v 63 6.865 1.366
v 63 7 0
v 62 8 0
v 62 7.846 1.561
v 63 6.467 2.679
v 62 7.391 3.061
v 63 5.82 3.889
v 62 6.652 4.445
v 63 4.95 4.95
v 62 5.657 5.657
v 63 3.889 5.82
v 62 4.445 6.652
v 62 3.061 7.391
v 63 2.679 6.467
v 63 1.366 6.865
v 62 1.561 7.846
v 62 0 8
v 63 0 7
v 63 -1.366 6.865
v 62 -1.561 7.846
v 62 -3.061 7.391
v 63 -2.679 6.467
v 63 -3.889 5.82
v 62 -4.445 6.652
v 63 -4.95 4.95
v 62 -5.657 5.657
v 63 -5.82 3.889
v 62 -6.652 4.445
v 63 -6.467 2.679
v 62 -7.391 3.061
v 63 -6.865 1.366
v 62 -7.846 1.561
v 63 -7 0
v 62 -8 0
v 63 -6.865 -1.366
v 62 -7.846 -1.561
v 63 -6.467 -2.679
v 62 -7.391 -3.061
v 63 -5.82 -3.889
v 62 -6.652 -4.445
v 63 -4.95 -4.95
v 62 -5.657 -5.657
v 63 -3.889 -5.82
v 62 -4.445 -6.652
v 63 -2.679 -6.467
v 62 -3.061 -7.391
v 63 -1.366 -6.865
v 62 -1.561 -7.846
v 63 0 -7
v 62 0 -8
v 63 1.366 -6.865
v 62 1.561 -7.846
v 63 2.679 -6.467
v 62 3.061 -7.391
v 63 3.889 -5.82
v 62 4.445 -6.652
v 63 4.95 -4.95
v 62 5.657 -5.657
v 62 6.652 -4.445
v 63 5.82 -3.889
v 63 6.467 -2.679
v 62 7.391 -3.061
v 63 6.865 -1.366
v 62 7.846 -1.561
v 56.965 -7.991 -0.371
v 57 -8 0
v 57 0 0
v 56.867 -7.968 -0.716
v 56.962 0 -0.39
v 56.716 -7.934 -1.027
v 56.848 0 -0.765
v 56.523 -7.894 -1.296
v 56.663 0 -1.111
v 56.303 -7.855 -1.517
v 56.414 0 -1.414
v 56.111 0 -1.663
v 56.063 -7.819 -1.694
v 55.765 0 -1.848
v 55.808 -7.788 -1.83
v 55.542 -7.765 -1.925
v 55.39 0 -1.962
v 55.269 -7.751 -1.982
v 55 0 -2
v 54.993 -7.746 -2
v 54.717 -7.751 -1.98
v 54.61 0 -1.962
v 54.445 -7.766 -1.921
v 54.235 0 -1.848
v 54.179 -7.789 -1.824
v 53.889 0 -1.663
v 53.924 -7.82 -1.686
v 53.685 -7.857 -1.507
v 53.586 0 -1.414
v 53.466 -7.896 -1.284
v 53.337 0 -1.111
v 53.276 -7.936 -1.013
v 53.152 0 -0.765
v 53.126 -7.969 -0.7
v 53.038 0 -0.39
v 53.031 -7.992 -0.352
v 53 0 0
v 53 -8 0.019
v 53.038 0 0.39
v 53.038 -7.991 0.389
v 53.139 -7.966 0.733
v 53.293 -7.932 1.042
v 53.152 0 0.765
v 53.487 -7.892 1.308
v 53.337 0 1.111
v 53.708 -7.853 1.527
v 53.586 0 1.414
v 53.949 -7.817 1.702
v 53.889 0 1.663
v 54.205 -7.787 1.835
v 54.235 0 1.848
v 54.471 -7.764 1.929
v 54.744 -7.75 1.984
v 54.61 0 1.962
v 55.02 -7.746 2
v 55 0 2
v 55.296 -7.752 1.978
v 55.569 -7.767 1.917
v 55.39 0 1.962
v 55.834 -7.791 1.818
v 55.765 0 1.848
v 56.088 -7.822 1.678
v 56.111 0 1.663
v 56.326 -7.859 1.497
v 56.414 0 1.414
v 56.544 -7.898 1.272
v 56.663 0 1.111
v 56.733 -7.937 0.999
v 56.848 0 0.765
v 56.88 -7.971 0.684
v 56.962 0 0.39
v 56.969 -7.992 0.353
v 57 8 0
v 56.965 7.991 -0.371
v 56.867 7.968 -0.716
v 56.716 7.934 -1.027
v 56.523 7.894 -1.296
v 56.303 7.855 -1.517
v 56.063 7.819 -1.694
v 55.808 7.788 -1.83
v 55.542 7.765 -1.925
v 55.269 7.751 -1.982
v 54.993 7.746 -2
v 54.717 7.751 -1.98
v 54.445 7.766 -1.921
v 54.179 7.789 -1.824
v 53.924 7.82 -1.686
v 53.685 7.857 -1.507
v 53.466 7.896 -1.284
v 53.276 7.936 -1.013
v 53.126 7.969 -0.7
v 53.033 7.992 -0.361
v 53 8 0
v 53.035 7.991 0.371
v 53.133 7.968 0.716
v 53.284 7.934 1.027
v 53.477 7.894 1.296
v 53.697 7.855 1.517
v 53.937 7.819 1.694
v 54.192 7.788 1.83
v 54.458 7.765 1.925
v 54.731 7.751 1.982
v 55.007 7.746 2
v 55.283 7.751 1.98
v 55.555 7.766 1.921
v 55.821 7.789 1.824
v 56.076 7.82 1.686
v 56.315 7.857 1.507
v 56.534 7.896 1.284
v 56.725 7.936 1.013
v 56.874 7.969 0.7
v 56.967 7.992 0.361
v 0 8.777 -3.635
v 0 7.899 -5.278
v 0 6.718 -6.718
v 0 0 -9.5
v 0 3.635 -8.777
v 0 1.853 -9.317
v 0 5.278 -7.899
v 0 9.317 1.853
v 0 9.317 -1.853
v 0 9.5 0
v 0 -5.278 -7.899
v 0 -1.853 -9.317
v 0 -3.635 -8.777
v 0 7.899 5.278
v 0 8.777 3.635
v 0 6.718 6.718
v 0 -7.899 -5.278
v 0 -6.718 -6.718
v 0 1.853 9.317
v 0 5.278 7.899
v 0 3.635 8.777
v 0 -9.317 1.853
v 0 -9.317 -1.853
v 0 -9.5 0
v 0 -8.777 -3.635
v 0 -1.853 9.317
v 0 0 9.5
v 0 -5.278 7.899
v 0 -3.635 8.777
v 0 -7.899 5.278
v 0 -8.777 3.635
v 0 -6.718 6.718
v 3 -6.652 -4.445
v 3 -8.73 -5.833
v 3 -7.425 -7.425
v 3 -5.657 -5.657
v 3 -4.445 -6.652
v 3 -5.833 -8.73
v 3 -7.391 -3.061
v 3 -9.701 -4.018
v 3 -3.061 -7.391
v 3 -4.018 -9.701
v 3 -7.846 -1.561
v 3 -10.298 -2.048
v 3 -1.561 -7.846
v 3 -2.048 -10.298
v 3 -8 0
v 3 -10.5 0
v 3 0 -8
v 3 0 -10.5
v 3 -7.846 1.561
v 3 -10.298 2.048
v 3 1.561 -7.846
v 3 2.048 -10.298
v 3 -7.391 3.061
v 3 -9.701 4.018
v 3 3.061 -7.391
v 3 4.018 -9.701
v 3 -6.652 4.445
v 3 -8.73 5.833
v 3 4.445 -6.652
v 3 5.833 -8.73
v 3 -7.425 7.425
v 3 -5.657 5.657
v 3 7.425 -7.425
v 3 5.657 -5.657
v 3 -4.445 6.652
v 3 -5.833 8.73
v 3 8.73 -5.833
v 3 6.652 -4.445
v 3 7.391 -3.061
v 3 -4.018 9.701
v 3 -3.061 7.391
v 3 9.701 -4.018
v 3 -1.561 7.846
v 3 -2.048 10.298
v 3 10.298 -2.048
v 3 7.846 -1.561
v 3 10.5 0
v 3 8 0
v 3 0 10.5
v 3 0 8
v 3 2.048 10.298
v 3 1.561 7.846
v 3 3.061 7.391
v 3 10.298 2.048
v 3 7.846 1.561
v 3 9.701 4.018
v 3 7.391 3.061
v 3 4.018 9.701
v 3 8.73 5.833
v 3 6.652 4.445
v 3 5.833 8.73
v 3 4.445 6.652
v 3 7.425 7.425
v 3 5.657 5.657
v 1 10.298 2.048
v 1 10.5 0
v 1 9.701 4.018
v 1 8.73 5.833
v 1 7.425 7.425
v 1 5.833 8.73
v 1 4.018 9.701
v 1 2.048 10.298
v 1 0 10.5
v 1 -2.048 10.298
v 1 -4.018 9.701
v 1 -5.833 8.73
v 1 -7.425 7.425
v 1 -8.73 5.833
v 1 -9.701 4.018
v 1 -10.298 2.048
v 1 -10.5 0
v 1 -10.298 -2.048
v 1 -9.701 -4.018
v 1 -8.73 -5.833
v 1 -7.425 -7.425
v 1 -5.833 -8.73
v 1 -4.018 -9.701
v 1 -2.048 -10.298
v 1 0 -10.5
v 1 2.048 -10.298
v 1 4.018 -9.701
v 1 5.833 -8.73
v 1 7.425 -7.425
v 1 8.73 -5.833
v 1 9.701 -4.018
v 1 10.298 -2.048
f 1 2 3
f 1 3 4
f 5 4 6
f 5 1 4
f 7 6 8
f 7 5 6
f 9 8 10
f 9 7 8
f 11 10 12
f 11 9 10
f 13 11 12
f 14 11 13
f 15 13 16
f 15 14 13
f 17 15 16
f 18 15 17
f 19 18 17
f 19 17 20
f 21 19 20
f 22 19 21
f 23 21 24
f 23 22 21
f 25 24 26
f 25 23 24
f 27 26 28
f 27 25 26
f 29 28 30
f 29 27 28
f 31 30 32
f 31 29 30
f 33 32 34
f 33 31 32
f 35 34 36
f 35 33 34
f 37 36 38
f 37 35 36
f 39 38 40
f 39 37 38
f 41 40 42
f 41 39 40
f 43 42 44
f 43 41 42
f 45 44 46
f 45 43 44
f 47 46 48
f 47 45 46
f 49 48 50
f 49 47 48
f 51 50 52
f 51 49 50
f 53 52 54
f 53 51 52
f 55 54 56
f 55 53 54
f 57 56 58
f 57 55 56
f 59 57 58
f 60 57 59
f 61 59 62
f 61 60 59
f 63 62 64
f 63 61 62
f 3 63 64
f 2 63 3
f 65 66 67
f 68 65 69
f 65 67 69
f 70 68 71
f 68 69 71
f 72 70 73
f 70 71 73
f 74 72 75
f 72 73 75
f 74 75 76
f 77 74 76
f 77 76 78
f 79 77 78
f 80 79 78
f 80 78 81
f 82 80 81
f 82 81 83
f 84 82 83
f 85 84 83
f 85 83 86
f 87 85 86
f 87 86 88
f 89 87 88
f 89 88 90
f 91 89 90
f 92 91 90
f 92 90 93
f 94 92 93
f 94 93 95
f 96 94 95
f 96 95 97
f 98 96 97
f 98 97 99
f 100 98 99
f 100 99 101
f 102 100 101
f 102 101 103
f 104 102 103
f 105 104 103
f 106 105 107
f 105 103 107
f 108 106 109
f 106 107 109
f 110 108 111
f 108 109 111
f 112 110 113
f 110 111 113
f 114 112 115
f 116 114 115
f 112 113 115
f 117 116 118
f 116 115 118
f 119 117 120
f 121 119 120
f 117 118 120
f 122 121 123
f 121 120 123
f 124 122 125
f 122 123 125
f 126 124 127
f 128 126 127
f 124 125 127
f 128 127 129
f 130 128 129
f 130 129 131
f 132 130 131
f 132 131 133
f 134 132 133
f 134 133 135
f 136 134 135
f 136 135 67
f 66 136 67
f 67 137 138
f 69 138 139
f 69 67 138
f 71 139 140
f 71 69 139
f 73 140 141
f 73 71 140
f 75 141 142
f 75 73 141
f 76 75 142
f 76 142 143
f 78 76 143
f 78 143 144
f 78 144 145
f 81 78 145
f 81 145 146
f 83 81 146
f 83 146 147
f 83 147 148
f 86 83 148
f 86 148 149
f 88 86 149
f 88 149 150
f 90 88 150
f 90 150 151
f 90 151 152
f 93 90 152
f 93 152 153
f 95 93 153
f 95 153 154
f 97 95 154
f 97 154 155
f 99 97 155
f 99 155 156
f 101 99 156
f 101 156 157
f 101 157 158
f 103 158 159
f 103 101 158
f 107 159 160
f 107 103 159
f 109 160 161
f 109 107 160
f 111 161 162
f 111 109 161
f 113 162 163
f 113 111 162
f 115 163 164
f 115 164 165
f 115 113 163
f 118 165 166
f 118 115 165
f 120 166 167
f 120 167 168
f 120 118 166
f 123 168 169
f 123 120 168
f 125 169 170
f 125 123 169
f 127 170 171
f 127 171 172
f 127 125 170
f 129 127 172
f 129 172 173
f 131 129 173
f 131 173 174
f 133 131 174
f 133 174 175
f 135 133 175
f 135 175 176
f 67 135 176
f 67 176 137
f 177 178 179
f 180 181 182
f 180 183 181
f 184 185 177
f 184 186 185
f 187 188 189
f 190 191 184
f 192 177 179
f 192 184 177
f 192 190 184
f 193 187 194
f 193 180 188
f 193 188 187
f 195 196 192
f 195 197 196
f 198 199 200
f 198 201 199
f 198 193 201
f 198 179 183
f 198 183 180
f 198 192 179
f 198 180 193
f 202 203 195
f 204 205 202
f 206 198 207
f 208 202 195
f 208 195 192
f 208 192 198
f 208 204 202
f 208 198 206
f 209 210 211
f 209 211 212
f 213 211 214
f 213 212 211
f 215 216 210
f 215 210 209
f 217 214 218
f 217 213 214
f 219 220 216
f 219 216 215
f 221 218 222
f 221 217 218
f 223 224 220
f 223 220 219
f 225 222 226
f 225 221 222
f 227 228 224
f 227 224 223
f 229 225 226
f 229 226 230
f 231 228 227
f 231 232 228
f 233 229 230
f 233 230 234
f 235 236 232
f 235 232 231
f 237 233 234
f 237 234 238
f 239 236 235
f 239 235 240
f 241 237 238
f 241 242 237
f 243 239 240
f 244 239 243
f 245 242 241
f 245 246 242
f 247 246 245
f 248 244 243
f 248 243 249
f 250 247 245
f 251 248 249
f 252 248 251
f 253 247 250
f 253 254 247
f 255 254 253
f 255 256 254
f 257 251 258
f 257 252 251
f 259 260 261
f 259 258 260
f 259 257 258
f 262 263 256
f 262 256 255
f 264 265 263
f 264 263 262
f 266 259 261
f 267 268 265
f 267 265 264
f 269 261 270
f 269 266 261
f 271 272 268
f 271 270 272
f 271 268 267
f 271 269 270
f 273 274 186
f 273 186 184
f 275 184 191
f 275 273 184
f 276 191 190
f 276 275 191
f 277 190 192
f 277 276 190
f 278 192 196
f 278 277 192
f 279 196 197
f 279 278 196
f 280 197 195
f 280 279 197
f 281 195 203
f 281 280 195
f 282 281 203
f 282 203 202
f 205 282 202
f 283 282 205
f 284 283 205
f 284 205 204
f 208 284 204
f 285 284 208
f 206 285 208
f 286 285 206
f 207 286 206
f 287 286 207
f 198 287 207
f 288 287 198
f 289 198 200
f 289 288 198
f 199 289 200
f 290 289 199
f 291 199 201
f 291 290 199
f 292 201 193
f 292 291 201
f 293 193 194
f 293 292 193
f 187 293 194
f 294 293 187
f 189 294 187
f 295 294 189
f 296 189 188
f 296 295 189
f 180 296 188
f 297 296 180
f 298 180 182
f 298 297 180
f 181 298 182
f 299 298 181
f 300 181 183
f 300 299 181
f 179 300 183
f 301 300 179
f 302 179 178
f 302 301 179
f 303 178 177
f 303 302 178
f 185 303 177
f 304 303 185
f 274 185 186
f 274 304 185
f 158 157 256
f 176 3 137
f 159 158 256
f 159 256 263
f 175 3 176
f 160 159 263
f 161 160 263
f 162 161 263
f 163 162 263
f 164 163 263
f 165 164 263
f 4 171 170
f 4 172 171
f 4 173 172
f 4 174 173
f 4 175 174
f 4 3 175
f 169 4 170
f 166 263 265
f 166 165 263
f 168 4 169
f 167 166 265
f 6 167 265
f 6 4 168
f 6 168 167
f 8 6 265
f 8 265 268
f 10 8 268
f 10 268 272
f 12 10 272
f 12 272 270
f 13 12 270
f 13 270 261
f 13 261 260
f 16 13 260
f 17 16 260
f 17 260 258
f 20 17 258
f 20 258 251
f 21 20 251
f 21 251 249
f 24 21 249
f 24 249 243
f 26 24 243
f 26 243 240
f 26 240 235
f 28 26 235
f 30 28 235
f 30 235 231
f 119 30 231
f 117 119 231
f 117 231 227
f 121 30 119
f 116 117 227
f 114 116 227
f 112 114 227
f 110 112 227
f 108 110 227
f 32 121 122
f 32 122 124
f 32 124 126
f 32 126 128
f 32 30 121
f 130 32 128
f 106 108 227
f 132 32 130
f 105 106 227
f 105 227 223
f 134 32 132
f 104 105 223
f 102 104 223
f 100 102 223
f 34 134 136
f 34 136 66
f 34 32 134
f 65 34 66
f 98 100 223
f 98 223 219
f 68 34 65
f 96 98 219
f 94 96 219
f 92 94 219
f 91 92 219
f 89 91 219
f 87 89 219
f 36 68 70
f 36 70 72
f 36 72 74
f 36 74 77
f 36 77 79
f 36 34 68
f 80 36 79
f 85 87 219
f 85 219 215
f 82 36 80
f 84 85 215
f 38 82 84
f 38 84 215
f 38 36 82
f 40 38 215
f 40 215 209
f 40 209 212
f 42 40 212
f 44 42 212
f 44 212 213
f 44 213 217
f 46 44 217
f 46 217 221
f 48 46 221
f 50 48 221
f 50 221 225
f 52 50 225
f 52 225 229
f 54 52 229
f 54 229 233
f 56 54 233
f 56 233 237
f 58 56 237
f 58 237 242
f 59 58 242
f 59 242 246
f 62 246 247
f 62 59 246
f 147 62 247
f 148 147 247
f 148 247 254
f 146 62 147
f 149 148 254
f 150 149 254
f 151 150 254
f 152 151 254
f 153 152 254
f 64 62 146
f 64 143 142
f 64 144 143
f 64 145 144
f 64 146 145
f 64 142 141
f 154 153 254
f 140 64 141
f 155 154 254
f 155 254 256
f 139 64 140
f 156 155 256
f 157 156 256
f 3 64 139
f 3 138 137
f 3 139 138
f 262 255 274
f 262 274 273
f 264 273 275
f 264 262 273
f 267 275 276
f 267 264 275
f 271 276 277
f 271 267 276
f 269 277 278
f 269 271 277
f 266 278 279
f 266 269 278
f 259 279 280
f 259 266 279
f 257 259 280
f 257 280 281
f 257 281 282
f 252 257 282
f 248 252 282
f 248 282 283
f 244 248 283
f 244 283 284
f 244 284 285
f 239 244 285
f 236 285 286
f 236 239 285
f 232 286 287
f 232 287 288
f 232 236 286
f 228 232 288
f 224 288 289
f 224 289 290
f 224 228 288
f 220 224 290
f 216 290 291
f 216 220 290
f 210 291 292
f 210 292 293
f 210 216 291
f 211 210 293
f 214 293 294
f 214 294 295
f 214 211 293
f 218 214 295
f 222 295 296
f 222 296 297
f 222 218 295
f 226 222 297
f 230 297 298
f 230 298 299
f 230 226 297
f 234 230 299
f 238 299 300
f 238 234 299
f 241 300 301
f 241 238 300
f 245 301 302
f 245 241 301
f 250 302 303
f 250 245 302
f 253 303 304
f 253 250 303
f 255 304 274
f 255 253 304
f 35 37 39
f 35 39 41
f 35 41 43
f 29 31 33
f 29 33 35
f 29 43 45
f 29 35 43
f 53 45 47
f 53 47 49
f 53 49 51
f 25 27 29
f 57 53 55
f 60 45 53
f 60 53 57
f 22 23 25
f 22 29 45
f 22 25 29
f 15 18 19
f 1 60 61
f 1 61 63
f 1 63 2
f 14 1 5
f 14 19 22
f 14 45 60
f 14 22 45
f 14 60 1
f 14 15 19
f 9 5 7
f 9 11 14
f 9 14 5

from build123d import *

# Parameters (mm, degrees)
SFAZOWANIE2_SIZE                = 1
SZKIC2_R                        = 2
WYTNIJ_WYCI_GNI_CIE1_DEPTH      = 11.5
WYTNIJ_WYCI_GNI_CIE1_DEPTH_BACK = 11.5


with BuildPart() as part:
    # Szkic1 → Obrót1 (revolve)
    with BuildSketch(Plane.XY):
        Polygon((0, 0), (0, 10.5), (3, 10.5), (3, 8), (63, 8), (63, 0), align=None)
    revolve(axis=Axis((0, 0, 0), (1, 0, 0)))

    # Sfazowanie2
    sfazowanie2_edges = [part.edges().sort_by_distance(p)[0] for p in [
        (0, -10.5, 0),
        (63, -8, 0),
    ]]
    chamfer(sfazowanie2_edges, length=SFAZOWANIE2_SIZE)

    # Szkic2 → Wytnij-wyciągnięcie1 (cut, two sides)
    with BuildSketch(Plane(origin=(0, 0, 0), x_dir=(1, 0, 0), z_dir=(0, 1, 0))) as wytnij_wyci_gni_cie1_sk:
        with Locations((55, 0)):
            Circle(SZKIC2_R)
    extrude(amount=WYTNIJ_WYCI_GNI_CIE1_DEPTH, mode=Mode.SUBTRACT)
    extrude(wytnij_wyci_gni_cie1_sk.sketch, amount=-WYTNIJ_WYCI_GNI_CIE1_DEPTH_BACK, mode=Mode.SUBTRACT)


solid = part.part
